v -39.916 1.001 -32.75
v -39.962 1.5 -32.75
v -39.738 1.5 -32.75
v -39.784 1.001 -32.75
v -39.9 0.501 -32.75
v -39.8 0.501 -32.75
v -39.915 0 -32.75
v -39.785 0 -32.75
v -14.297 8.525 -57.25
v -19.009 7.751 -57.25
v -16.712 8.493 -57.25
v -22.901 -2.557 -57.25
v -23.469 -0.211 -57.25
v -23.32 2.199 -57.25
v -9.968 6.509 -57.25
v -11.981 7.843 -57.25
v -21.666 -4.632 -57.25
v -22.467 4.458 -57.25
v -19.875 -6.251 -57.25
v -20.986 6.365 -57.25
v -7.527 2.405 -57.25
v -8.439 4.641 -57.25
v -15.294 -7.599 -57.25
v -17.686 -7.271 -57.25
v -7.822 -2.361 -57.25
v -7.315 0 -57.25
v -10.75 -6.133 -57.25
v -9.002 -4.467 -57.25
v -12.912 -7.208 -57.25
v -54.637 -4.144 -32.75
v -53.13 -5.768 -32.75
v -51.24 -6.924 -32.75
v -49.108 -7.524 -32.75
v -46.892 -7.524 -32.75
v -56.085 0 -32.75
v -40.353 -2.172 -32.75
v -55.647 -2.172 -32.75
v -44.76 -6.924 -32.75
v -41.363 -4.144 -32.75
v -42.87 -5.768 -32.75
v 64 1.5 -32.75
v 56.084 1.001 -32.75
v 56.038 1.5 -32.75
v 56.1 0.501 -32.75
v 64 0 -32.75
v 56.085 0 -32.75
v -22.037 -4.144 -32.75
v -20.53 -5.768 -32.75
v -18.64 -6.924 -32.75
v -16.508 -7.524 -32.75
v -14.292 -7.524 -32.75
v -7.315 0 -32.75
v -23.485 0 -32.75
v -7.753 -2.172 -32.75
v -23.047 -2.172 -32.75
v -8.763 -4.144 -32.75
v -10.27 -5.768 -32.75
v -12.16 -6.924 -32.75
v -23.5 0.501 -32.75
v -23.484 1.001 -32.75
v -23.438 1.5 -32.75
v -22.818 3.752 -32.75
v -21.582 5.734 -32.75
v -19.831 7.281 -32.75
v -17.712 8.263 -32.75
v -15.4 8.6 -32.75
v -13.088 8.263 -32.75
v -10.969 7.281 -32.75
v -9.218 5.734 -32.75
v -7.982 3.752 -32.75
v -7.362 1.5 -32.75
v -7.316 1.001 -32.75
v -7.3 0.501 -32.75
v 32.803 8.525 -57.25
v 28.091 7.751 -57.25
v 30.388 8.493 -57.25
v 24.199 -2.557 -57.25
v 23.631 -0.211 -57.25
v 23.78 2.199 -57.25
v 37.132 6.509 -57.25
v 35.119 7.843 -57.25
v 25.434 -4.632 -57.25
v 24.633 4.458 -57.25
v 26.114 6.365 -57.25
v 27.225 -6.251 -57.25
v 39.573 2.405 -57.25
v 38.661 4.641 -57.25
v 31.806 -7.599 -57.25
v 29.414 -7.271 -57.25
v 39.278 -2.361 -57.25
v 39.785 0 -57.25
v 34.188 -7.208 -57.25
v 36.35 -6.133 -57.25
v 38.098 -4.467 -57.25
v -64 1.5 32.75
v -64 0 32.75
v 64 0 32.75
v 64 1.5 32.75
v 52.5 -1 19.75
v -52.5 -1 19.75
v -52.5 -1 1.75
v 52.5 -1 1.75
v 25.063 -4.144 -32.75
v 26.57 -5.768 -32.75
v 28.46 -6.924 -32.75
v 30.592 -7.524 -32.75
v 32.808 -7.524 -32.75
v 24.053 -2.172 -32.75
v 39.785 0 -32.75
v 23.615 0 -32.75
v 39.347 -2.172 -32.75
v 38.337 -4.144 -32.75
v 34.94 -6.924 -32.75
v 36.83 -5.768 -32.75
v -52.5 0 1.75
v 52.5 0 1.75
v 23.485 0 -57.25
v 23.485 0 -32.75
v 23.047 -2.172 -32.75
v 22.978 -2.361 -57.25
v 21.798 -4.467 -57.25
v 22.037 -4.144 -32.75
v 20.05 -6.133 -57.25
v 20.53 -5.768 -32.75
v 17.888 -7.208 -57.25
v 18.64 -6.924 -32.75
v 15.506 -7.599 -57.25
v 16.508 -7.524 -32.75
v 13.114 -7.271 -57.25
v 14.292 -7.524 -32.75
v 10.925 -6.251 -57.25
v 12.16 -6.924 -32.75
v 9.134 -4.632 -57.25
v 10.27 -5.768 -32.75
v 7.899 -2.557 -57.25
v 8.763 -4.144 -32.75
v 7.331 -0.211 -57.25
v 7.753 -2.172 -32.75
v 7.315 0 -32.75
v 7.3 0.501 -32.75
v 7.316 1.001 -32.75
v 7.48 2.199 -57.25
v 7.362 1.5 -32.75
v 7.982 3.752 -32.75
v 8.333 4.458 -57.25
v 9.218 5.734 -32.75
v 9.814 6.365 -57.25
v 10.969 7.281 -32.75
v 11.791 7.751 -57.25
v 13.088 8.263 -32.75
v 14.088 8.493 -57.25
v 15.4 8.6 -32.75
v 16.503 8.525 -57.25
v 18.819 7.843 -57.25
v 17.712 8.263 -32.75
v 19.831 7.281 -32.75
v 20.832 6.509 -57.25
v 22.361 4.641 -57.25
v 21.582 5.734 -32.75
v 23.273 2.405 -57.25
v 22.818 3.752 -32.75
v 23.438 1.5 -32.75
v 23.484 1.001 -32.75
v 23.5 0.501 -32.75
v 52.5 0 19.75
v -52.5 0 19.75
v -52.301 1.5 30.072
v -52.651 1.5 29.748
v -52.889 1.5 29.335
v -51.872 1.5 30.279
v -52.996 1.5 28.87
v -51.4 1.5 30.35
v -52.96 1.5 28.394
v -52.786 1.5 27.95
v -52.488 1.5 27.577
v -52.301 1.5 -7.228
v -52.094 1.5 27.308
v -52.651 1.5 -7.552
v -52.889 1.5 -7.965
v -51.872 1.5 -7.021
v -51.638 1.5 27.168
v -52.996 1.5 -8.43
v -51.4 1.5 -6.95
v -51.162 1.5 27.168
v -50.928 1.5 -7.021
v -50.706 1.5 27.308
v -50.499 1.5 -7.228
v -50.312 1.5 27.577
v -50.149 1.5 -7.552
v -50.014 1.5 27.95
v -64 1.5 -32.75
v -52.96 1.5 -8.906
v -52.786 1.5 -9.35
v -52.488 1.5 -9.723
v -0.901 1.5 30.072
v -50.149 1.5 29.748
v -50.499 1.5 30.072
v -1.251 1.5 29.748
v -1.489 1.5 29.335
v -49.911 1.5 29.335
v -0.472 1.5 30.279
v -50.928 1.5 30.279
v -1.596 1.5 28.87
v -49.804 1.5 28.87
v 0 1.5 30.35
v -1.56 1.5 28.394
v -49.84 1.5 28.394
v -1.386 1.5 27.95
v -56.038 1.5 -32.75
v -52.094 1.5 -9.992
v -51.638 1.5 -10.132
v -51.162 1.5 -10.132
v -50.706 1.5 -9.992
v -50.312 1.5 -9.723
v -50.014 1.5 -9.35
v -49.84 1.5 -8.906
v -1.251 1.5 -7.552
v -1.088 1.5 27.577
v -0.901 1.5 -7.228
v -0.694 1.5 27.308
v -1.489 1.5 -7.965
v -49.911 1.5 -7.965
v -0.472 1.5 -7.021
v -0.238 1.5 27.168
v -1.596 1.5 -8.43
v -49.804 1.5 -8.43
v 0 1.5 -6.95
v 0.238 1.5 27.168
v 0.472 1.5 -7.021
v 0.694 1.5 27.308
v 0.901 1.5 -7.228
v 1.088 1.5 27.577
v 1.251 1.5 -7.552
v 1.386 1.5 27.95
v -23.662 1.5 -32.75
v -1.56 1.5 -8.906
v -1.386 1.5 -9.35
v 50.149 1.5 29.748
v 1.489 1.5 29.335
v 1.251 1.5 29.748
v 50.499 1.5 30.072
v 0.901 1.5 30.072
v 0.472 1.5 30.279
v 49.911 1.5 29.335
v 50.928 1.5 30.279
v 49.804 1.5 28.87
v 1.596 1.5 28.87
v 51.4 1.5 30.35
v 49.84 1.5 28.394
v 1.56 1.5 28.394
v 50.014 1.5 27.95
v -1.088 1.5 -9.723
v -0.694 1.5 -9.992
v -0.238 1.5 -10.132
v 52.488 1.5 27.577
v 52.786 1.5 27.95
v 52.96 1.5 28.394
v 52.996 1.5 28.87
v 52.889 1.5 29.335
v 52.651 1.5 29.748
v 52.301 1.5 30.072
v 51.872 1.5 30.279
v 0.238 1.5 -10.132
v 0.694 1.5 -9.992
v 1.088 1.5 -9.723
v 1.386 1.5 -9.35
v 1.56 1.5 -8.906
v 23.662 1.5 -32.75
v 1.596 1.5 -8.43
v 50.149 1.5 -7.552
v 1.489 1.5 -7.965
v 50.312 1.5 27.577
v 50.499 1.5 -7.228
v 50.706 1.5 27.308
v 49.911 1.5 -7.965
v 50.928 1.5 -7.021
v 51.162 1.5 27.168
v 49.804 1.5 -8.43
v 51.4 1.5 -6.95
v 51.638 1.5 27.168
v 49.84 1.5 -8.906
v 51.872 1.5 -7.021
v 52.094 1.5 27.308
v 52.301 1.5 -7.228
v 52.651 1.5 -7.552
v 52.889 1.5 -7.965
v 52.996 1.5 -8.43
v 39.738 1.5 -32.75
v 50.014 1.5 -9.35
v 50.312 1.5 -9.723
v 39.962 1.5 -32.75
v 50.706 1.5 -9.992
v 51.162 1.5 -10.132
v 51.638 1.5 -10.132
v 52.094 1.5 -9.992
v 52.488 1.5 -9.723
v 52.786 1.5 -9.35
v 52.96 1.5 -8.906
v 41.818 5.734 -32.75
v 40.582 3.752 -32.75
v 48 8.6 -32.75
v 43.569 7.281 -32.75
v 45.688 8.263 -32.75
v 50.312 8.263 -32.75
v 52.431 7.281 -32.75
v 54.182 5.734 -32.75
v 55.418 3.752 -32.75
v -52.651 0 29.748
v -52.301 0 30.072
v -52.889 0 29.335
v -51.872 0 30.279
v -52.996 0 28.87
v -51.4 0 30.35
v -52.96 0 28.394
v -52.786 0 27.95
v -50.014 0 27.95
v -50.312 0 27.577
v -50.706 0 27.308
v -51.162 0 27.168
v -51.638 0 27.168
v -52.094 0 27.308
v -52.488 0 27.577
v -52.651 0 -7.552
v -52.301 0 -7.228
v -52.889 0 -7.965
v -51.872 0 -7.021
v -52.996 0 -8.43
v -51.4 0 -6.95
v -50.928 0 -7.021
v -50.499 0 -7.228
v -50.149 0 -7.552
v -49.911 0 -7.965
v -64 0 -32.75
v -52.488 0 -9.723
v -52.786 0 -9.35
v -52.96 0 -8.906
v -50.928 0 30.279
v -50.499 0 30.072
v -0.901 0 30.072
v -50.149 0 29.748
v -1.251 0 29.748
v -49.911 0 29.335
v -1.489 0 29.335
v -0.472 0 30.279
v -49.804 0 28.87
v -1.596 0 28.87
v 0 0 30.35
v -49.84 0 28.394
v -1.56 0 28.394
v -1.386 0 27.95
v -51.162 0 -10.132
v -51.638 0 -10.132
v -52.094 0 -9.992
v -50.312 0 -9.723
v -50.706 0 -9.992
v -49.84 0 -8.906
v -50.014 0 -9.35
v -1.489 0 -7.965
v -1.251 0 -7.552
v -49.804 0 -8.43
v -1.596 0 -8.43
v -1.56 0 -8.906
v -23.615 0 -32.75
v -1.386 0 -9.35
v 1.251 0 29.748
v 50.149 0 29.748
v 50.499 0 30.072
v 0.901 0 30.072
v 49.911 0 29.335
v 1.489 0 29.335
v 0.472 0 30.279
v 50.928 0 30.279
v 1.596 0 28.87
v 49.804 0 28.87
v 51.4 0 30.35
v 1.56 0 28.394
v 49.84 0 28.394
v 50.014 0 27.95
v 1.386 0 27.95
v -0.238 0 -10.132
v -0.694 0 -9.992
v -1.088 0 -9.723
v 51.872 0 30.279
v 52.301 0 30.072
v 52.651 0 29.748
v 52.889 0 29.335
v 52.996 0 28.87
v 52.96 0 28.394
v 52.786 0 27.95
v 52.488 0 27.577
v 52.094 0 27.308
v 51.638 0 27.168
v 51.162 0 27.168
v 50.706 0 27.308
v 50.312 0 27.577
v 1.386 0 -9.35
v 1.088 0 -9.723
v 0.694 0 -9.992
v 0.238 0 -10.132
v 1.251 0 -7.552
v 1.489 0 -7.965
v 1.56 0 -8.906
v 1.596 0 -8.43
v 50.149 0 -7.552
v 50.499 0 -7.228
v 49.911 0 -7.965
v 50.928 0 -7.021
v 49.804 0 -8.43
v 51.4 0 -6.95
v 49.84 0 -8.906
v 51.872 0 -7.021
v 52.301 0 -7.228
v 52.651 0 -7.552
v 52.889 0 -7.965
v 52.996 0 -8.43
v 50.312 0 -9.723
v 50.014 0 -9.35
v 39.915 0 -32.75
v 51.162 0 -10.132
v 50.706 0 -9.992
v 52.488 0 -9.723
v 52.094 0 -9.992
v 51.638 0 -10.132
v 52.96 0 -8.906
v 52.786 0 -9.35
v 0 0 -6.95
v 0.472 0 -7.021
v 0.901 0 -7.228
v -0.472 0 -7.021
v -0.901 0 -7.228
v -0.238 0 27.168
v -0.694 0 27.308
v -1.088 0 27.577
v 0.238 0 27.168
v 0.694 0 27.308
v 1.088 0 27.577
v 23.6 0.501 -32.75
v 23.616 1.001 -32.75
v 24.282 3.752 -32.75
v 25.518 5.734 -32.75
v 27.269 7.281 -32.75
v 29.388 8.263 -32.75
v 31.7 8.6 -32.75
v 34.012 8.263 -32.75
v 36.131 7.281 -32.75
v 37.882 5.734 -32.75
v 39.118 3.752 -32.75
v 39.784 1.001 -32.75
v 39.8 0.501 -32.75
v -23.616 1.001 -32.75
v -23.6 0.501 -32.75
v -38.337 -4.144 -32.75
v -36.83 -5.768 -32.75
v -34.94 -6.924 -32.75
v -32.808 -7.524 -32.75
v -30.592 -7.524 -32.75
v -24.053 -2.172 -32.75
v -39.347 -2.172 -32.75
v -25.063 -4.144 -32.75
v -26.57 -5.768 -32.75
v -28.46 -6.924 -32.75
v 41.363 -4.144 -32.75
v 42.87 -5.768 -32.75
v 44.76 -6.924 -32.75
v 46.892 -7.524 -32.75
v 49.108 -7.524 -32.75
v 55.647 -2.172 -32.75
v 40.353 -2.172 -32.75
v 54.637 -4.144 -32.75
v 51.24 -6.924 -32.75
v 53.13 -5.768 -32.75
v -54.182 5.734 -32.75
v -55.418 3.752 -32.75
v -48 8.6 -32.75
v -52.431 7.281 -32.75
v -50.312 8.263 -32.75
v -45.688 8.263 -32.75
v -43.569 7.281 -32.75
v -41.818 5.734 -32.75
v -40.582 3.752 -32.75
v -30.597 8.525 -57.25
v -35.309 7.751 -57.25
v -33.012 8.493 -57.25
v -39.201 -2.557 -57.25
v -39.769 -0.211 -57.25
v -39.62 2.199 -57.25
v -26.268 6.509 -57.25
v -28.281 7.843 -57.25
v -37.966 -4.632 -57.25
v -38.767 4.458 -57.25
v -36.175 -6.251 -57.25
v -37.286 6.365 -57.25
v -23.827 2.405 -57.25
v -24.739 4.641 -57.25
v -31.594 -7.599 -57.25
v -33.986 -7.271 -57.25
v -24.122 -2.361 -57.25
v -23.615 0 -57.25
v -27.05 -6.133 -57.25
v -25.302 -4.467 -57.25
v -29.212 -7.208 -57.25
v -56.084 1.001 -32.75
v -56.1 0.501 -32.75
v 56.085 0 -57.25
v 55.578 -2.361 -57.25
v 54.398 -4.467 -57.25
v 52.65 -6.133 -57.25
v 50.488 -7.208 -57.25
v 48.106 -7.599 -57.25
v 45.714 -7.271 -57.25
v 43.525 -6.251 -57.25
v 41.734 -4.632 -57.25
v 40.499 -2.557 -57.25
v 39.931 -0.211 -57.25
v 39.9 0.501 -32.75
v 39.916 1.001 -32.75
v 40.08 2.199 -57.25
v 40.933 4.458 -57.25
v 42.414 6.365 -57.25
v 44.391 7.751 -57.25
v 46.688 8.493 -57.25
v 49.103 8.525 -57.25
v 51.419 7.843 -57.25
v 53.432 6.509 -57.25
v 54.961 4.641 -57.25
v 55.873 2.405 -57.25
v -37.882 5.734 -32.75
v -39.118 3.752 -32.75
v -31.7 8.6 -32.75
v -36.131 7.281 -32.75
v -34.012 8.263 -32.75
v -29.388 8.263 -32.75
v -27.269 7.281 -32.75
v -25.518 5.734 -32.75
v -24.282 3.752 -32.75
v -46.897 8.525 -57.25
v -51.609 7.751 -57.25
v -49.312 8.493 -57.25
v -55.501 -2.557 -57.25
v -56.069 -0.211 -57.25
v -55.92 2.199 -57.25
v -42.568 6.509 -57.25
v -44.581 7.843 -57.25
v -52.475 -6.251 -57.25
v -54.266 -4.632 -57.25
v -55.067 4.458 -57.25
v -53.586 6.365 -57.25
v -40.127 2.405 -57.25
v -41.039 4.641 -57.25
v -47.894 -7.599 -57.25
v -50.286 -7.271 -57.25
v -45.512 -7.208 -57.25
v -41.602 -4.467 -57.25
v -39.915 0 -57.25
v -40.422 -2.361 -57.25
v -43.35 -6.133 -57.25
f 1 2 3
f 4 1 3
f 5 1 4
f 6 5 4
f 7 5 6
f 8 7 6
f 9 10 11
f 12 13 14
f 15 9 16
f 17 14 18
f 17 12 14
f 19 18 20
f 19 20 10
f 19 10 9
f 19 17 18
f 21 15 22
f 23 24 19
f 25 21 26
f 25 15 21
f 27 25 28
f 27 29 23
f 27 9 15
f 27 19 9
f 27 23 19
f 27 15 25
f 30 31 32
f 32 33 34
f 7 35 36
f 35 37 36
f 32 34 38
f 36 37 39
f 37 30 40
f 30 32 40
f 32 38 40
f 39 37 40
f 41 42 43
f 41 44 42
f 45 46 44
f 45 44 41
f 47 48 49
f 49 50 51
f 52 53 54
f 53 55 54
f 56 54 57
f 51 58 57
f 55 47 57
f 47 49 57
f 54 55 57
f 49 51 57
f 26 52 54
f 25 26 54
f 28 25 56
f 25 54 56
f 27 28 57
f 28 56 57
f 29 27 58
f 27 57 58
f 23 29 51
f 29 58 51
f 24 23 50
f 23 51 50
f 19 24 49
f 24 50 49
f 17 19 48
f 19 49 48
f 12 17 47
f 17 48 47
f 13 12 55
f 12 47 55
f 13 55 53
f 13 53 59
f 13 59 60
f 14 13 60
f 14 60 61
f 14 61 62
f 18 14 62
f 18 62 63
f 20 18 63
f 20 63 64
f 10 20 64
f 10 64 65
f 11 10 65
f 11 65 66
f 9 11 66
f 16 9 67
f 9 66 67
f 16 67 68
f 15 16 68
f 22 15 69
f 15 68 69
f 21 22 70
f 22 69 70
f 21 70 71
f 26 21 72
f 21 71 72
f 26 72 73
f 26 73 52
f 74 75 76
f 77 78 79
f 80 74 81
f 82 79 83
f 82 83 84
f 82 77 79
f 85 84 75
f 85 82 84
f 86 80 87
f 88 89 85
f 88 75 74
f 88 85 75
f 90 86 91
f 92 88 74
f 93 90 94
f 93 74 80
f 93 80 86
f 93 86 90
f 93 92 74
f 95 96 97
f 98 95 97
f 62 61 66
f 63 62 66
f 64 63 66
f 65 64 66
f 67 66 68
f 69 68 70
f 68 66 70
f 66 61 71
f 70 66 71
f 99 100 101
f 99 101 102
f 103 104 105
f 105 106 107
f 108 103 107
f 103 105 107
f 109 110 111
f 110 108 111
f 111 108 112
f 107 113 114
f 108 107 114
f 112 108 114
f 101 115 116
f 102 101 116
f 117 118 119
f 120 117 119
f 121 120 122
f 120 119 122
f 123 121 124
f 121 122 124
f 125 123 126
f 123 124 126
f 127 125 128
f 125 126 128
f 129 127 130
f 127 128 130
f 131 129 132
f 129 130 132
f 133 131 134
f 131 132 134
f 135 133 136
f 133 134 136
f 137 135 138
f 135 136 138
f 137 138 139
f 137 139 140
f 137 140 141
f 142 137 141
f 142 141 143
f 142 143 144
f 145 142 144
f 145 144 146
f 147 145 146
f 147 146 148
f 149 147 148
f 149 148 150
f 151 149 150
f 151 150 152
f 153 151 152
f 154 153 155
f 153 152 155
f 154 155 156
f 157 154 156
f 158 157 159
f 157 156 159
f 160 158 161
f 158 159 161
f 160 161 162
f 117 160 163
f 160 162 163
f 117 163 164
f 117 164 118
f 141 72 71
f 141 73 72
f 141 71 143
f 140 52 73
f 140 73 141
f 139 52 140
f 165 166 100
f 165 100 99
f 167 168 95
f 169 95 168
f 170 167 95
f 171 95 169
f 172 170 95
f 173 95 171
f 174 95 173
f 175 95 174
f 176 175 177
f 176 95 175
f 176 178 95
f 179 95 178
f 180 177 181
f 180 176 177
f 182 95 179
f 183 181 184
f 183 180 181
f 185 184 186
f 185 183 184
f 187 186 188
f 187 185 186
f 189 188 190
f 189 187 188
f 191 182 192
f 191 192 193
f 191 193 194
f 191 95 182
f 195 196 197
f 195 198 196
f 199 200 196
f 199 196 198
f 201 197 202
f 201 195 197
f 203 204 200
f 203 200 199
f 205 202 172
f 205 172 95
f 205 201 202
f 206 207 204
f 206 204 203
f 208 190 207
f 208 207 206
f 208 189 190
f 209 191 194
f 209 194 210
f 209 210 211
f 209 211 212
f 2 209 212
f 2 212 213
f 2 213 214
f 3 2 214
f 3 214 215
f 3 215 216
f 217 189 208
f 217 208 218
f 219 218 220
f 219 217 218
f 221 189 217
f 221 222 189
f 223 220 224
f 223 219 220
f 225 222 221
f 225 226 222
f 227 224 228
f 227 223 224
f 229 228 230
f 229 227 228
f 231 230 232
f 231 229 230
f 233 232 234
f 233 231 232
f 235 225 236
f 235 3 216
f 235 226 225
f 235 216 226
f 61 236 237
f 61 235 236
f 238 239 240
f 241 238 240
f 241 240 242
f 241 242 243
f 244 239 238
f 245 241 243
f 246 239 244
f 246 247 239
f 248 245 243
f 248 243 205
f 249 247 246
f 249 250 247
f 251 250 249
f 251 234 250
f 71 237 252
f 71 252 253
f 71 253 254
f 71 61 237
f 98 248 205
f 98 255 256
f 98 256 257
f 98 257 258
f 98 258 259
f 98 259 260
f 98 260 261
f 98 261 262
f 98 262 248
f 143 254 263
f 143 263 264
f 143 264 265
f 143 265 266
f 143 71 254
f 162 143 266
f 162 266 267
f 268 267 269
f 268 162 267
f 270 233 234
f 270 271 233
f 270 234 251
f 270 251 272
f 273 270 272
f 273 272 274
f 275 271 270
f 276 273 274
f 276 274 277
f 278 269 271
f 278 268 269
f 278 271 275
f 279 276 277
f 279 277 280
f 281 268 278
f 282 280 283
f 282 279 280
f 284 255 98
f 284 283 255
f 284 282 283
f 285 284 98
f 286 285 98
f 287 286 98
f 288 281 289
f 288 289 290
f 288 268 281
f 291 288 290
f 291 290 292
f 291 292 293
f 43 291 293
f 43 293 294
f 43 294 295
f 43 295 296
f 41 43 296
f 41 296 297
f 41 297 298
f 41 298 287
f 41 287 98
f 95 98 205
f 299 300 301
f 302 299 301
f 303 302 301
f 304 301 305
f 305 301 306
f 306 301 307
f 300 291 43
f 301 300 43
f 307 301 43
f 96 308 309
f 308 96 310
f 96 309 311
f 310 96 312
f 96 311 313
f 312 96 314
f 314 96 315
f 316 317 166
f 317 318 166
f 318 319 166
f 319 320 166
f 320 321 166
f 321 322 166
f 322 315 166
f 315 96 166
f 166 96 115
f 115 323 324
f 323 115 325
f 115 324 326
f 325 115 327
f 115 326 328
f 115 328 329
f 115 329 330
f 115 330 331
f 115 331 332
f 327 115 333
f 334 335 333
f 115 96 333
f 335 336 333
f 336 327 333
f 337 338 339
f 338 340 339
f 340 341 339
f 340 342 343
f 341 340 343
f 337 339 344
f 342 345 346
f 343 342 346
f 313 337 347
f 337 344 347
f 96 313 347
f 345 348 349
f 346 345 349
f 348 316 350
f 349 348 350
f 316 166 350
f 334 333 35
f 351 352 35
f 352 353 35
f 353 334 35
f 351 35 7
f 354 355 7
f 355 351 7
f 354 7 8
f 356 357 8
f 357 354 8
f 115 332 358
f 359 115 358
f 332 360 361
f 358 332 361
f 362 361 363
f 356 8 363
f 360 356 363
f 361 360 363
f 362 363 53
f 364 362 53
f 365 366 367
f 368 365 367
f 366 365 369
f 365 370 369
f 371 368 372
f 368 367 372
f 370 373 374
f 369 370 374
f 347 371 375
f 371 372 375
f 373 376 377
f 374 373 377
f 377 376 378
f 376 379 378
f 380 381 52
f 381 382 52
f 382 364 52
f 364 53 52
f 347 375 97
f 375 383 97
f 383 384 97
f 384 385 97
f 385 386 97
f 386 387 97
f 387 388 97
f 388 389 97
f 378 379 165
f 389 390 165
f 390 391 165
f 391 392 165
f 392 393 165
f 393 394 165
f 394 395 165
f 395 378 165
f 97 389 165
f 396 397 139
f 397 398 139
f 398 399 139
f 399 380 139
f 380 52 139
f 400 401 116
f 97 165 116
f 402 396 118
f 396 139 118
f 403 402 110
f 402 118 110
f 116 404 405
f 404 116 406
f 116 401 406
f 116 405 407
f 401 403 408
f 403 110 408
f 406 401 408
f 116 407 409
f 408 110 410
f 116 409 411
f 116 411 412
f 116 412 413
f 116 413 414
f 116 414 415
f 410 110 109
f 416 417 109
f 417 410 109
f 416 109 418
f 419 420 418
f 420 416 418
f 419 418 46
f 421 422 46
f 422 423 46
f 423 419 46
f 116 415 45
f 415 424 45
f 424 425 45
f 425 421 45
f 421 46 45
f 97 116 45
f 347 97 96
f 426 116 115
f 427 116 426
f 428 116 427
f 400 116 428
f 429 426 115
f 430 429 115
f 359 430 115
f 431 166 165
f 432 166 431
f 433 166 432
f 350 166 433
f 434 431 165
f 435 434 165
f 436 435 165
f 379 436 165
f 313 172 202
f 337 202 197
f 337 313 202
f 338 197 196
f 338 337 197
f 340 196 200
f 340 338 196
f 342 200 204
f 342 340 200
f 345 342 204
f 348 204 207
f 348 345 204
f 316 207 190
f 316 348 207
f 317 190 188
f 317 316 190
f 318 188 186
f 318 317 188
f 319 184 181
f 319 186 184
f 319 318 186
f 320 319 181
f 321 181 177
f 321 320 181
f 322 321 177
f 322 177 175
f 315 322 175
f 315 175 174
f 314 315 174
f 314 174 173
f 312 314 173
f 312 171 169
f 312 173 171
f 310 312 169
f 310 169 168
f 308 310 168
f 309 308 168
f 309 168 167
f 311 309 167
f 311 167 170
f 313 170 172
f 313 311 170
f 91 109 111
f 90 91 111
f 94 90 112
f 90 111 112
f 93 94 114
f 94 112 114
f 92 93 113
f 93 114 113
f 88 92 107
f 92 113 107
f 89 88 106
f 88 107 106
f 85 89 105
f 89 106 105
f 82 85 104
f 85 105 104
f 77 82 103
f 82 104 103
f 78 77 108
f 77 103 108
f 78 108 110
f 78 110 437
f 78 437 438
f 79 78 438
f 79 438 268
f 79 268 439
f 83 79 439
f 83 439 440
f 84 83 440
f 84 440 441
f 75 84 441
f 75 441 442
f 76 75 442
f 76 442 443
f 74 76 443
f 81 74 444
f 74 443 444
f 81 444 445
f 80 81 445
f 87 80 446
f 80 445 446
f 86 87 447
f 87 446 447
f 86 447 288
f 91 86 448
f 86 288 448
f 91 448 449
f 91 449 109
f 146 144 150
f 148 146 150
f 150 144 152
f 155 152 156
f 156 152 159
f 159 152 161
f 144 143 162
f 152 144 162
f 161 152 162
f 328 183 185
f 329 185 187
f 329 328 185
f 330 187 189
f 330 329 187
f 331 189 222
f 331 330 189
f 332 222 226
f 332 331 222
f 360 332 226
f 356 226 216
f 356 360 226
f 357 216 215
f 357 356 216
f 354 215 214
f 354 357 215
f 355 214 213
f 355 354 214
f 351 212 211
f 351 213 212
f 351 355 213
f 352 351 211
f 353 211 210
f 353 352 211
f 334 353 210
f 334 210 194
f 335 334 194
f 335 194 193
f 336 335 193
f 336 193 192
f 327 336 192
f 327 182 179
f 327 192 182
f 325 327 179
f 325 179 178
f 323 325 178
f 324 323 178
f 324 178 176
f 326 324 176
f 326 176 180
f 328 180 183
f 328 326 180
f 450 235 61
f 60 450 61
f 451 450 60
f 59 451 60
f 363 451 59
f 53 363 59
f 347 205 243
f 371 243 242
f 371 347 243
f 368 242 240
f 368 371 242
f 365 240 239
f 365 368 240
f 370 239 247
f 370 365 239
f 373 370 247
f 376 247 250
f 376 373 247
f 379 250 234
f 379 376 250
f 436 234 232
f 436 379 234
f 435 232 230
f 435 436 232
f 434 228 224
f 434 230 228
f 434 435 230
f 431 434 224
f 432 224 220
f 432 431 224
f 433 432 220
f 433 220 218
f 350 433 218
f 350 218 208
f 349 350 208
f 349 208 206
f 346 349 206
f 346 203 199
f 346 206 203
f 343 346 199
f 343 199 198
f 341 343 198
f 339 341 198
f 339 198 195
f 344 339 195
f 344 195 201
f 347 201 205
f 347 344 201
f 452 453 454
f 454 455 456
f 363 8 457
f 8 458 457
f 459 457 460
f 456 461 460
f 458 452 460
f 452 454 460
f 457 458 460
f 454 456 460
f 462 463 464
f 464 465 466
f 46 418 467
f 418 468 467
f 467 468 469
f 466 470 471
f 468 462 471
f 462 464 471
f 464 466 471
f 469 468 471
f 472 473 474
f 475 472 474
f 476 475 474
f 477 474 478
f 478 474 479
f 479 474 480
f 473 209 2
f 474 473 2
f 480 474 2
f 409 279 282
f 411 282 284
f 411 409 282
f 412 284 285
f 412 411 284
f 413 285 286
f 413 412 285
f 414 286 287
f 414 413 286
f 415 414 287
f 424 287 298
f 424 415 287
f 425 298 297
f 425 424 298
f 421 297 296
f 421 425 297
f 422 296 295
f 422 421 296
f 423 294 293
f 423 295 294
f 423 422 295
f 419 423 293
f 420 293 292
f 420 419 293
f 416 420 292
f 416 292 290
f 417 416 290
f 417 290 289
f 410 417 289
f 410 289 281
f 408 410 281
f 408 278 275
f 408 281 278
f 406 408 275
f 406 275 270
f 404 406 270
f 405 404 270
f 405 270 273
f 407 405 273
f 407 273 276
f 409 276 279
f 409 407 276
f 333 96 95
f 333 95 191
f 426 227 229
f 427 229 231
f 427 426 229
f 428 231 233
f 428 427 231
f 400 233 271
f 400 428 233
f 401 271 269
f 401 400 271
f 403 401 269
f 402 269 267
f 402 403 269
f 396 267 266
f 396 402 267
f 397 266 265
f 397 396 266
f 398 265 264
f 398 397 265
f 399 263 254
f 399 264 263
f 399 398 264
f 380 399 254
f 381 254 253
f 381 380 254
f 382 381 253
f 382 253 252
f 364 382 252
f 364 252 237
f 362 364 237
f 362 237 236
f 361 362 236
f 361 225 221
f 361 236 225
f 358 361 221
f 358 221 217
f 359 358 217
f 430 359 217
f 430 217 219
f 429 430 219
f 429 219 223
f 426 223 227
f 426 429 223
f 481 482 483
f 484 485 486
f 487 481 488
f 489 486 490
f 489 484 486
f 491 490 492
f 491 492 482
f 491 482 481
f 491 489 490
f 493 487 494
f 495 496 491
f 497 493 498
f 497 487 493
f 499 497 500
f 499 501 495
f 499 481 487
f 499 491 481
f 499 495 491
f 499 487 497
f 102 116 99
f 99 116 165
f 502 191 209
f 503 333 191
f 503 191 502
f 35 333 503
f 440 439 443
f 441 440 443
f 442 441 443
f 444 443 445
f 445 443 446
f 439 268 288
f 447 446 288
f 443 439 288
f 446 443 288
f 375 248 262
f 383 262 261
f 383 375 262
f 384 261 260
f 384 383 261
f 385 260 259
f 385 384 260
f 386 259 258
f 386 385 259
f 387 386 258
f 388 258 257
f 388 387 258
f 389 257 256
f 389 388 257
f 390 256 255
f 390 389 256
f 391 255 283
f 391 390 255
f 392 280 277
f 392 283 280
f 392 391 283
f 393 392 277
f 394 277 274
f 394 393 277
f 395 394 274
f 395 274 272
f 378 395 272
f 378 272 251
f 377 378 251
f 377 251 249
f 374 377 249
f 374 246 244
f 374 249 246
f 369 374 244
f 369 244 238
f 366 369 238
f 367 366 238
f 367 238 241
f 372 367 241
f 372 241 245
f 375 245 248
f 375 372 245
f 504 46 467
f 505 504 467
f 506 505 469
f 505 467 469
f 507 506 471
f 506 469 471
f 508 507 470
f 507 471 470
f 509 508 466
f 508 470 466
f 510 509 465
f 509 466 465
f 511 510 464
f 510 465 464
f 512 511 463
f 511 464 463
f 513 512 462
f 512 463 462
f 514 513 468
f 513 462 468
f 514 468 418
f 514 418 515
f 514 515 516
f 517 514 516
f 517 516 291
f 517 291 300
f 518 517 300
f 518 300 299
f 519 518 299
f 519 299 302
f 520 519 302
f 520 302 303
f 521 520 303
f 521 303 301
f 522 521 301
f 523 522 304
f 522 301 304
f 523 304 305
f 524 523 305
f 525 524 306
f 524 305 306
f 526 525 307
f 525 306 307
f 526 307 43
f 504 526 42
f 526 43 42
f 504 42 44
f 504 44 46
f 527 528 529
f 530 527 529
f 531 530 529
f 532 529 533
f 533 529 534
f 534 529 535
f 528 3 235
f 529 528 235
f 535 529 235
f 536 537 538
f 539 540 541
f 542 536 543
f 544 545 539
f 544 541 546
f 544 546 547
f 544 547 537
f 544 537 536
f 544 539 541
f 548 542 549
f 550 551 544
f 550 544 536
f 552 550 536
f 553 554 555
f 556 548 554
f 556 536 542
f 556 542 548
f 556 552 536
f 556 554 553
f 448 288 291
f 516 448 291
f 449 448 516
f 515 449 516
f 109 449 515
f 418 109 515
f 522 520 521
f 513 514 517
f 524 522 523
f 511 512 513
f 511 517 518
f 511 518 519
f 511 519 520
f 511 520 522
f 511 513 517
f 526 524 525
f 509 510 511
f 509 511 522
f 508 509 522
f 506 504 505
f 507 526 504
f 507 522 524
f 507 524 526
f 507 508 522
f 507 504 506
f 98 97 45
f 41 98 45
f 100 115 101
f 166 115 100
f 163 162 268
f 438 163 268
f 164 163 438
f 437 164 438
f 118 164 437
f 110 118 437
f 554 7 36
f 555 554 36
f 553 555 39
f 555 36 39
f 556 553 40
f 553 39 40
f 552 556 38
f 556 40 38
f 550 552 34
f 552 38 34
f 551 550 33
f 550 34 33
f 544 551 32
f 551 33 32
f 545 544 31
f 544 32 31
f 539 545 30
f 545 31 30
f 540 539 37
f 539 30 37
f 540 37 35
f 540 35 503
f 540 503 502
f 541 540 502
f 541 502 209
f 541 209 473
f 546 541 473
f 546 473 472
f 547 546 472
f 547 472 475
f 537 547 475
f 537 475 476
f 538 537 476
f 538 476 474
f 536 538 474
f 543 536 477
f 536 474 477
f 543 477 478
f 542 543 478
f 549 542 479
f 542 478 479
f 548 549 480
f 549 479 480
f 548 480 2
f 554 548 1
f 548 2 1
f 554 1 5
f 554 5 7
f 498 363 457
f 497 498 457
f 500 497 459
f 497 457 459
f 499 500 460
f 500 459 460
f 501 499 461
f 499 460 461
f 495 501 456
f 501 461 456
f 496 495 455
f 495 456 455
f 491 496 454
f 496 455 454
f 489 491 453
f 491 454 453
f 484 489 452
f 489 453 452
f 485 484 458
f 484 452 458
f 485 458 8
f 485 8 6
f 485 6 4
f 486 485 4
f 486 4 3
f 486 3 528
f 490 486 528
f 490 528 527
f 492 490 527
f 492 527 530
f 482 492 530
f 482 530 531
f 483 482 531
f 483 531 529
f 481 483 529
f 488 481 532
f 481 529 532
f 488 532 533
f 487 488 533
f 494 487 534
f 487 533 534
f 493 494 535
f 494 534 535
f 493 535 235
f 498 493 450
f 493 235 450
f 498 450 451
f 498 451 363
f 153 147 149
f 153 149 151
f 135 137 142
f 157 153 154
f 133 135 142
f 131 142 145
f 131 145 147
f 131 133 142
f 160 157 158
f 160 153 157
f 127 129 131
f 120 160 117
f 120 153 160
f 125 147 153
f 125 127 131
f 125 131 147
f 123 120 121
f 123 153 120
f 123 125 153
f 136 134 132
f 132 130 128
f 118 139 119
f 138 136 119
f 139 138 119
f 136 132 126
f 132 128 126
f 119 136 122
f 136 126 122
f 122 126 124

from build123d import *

# Parameters (mm, degrees)
SKETCH1_W           = 128
SKETCH1_H           = 65.5
BOSS_EXTRUDE1_DEPTH = 1.5
SKETCH2_R           = 1.6
CUT_EXTRUDE2_DEPTH  = 72.908361823
SKETCH3_W           = 105
SKETCH3_H           = 18
BOSS_EXTRUDE2_DEPTH = 1
SKETCH4_R           = 8.1
BOSS_EXTRUDE4_DEPTH = 24.5


with BuildPart() as part:
    # Sketch1 → Boss-Extrude1 (new body)
    with BuildSketch(Plane(origin=(0, 0, 0), x_dir=(1, 0, 0), z_dir=(0, 1, 0))):
        Rectangle(SKETCH1_W, SKETCH1_H)
    extrude(amount=BOSS_EXTRUDE1_DEPTH)

    # Sketch2 → Cut-Extrude2 (cut, through all)
    with BuildSketch(Plane(origin=(0, 0, 0), x_dir=(1, 0, 0), z_dir=(0, 1, 0))):
        with Locations(Location((-51.4, -28.75, 0), (0, 0, 270))):
            Circle(SKETCH2_R)
        with Locations(Location((0, -28.75, 0), (0, 0, 270))):
            Circle(SKETCH2_R)
        with Locations(Location((51.4, -28.75, 0), (0, 0, 270))):
            Circle(SKETCH2_R)
        with Locations(Location((-51.4, 8.55, 0), (0, 0, 270))):
            Circle(SKETCH2_R)
        with Locations(Location((0, 8.55, 0), (0, 0, 270))):
            Circle(SKETCH2_R)
        with Locations(Location((51.4, 8.55, 0), (0, 0, 270))):
            Circle(SKETCH2_R)
    extrude(amount=CUT_EXTRUDE2_DEPTH, mode=Mode.SUBTRACT)

    # Sketch3 → Boss-Extrude2 (add)
    with BuildSketch(Plane.XZ):
        with Locations((0, 10.75)):
            Rectangle(SKETCH3_W, SKETCH3_H)
    extrude(amount=BOSS_EXTRUDE2_DEPTH)

    # Sketch4 → Boss-Extrude4 (add)
    with BuildSketch(Plane(origin=(0, 0, -32.75), x_dir=(-1, 0, 0), z_dir=(0, 0, -1))):
        with Locations(Location((-48, 0.5, 0), (0, 0, 183.539026459))):
            Circle(SKETCH4_R)
        with Locations(Location((-31.7, 0.5, 0), (0, 0, 183.539026459))):
            Circle(SKETCH4_R)
        with Locations(Location((-15.4, 0.5, 0), (0, 0, 183.539026459))):
            Circle(SKETCH4_R)
        with Locations(Location((15.4, 0.5, 0), (0, 0, 183.539026459))):
            Circle(SKETCH4_R)
        with Locations(Location((31.7, 0.5, 0), (0, 0, 183.539026459))):
            Circle(SKETCH4_R)
        with Locations(Location((48, 0.5, 0), (0, 0, 183.539026459))):
            Circle(SKETCH4_R)
    extrude(amount=BOSS_EXTRUDE4_DEPTH)


solid = part.part
